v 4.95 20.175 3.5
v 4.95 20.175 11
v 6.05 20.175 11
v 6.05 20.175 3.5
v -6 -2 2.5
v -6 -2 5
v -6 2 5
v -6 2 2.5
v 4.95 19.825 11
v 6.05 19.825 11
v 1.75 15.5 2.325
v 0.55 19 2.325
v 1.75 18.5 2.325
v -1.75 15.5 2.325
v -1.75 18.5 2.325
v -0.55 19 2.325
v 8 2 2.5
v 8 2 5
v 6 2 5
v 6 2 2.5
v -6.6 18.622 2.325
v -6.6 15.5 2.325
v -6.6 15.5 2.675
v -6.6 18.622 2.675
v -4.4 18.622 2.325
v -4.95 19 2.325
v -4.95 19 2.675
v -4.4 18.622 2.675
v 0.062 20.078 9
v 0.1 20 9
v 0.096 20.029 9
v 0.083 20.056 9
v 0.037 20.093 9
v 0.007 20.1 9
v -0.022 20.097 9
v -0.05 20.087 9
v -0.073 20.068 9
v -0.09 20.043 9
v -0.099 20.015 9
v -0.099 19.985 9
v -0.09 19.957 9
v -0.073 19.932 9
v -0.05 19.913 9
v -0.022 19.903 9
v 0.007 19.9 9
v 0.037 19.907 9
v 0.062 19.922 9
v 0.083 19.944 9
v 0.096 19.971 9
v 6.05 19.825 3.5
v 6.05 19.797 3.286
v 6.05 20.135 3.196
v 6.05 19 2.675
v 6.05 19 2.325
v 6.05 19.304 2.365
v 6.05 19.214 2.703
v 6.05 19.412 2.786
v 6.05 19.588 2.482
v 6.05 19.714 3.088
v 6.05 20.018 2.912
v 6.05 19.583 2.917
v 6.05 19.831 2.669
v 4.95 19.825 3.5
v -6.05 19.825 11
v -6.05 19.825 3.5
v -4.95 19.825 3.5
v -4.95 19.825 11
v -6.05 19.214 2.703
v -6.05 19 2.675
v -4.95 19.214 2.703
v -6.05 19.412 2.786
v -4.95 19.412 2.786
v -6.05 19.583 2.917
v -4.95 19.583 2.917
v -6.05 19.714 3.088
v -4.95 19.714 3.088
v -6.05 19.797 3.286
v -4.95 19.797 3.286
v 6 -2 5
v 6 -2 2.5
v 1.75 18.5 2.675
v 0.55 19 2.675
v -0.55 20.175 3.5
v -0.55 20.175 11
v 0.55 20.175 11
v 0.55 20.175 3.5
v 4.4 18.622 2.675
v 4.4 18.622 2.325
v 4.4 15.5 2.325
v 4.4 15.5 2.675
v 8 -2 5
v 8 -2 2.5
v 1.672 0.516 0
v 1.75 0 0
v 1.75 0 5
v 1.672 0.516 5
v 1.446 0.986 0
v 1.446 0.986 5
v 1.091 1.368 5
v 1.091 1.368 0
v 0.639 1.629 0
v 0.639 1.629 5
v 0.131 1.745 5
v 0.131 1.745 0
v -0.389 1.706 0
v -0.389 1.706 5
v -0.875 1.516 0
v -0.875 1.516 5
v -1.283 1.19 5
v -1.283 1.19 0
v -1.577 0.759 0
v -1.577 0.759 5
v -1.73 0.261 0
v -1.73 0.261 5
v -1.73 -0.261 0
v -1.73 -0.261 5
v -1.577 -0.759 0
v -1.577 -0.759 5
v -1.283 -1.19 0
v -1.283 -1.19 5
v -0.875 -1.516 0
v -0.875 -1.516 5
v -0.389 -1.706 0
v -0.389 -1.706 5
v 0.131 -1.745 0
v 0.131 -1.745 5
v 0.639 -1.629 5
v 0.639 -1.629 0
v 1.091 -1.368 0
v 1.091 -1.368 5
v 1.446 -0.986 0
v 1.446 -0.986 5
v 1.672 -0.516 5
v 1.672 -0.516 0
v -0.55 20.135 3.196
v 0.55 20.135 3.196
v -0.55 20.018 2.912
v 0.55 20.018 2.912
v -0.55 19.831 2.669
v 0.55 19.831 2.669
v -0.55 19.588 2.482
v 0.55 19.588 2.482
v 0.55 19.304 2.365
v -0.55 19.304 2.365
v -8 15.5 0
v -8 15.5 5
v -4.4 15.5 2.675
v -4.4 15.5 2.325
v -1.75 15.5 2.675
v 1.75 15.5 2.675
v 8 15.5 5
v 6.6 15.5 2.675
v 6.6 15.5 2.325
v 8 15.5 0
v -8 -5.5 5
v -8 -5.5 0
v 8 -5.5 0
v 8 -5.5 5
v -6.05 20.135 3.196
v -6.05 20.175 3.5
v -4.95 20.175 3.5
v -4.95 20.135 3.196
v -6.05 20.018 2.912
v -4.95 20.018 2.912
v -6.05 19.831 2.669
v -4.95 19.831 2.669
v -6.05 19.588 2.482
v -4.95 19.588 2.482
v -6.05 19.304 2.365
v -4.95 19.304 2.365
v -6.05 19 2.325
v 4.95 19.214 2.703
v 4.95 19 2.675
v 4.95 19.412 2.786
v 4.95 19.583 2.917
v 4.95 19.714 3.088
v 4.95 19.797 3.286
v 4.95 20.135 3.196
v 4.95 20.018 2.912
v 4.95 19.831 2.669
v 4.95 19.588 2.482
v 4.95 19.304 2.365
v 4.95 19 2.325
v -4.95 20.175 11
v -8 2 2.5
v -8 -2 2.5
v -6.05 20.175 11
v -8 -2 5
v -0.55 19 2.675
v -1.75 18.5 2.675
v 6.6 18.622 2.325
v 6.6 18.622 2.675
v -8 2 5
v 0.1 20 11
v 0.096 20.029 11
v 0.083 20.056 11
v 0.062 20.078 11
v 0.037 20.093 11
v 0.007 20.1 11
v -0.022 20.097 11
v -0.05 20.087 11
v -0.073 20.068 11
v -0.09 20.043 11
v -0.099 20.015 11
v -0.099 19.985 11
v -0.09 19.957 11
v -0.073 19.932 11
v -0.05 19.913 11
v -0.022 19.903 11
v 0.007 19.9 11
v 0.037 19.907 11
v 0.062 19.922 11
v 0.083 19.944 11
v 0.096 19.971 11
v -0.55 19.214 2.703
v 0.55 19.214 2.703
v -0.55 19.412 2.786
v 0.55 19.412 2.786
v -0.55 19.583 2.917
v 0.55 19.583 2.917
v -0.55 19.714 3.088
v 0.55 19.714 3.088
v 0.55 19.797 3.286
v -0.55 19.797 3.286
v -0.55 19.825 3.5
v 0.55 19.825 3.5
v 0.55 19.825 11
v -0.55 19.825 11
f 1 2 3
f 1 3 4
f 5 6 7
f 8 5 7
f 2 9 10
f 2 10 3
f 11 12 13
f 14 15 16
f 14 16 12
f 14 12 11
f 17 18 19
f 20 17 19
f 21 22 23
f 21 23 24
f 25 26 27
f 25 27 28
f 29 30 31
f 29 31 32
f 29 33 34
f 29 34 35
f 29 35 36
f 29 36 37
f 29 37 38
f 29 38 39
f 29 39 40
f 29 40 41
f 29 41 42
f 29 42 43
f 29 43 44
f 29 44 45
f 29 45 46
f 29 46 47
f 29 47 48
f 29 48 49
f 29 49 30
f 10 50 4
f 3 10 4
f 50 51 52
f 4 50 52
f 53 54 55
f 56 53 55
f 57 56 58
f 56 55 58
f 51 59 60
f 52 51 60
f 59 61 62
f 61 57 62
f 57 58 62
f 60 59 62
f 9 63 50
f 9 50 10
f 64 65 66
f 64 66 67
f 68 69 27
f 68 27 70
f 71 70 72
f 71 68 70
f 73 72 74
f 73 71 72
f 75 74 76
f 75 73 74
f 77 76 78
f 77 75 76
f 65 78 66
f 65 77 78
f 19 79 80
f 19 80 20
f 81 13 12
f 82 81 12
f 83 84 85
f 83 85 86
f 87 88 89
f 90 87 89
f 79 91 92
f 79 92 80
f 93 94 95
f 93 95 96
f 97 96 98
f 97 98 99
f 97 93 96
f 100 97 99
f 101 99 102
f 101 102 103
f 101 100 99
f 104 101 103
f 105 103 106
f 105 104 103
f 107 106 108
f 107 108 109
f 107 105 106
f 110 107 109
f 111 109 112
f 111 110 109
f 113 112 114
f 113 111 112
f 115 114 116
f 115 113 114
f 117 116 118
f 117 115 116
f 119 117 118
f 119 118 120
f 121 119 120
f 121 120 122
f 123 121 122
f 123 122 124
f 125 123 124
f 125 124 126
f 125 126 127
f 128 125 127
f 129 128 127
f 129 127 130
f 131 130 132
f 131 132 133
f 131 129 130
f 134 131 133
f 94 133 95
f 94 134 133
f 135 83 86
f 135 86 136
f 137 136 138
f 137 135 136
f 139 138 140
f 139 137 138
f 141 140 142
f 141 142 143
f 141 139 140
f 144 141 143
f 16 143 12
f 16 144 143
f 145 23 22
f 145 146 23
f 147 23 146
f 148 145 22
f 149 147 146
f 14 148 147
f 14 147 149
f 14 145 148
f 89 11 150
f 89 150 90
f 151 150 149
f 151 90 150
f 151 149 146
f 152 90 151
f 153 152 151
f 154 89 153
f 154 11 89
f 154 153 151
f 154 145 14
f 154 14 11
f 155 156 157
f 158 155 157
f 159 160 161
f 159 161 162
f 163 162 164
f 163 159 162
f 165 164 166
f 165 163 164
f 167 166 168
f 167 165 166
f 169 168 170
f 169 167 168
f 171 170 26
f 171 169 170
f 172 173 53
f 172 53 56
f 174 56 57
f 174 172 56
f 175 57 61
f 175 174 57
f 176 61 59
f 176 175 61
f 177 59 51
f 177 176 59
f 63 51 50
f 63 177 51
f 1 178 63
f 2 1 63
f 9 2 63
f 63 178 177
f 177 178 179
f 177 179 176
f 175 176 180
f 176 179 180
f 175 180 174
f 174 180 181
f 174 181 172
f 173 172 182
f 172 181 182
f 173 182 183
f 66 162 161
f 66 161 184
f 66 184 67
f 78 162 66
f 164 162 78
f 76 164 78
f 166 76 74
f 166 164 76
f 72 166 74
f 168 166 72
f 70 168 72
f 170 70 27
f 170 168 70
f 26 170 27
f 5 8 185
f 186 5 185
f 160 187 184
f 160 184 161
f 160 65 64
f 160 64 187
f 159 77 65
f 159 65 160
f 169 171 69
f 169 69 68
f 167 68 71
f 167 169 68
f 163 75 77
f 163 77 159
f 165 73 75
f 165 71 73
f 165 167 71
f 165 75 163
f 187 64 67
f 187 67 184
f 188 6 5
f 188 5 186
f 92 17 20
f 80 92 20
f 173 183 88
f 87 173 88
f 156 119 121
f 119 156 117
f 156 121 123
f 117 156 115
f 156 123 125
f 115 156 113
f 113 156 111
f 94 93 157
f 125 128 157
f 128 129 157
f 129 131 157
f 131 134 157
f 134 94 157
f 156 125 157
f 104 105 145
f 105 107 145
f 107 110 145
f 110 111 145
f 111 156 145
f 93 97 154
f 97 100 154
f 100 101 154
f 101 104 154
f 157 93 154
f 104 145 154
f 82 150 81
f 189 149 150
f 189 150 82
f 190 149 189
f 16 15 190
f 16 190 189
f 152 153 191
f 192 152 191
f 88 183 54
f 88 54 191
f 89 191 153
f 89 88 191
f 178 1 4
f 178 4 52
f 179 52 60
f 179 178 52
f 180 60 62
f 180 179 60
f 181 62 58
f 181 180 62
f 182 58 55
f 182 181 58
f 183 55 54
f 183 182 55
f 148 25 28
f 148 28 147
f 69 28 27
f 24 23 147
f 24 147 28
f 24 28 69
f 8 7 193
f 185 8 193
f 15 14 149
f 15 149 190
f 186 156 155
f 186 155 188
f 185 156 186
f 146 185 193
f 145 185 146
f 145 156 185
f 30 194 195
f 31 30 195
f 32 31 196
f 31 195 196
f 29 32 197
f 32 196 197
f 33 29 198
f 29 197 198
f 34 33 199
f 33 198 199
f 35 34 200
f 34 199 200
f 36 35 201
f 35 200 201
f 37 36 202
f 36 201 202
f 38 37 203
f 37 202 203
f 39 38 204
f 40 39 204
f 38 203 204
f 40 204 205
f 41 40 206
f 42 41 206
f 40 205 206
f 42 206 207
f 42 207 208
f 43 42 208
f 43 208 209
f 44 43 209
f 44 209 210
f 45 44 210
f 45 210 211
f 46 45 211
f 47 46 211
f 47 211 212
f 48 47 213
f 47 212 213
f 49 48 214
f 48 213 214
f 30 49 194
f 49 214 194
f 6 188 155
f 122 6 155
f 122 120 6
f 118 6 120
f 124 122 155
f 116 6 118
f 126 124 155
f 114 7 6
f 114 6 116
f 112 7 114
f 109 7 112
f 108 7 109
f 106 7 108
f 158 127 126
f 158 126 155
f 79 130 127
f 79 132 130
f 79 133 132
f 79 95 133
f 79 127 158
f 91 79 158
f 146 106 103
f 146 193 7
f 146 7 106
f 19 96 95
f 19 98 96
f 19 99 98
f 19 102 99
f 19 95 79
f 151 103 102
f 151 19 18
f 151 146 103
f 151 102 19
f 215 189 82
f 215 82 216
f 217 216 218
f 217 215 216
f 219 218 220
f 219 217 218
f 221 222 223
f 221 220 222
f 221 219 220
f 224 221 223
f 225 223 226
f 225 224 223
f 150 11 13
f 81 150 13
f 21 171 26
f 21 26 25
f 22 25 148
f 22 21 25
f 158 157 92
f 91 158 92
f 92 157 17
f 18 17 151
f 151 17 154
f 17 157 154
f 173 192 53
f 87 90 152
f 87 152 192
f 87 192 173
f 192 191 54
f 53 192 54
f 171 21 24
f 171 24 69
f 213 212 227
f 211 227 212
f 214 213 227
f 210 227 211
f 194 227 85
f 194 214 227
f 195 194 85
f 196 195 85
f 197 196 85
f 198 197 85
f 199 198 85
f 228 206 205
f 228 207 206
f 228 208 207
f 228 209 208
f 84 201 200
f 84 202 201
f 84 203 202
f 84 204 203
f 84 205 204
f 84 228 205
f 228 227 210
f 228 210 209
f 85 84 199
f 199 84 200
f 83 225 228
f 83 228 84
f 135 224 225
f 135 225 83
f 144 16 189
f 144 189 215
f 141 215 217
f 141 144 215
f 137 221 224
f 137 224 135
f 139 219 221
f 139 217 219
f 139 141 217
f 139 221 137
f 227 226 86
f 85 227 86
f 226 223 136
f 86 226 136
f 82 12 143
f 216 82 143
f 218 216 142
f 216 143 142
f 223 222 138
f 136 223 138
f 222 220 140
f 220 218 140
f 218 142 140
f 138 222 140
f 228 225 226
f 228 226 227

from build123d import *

# Parameters (mm, degrees)
SKETCH_1_W          = 16
SKETCH_1_H          = 21
SKETCH_1_R          = 1.75
EXTRUDE_1_DEPTH     = 5
EXTRUDE_1_2_DEPTH   = 16
CUT_EXTRUDE_1_DEPTH = 16
SKETCH_4_W          = 3.81913455
SKETCH_4_H          = 4
CUT_EXTRUDE_2_DEPTH = 2.5
SKETCH_5_R          = 0.1
CUT_EXTRUDE_3_DEPTH = 2


with BuildPart() as part:
    # Эскиз1 → Extrude 1 (new body)
    with BuildSketch(Plane.XY):
        with Locations((0, 5)):
            Rectangle(SKETCH_1_W, SKETCH_1_H)
        Circle(SKETCH_1_R, mode=Mode.SUBTRACT)
    extrude(amount=EXTRUDE_1_DEPTH)

    # Эскиз2 → Extrude 1 2 (add)
    with BuildSketch(Plane.ZY.offset(8)):
        with BuildLine():
            Line((2.675, 15.5), (2.675, 19))
            ThreePointArc((2.675, 19), (2.916636906, 19.583363094), (3.5, 19.825))
            Line((3.5, 19.825), (11, 19.825))
            Line((11, 19.825), (11, 20.175))
            Line((11, 20.175), (3.5, 20.175))
            ThreePointArc((3.5, 20.175), (2.669149532, 19.830850468), (2.325, 19))
            Line((2.325, 19), (2.325, 15.5))
            Line((2.325, 15.5), (2.675, 15.5))
        make_face()
    extrude(amount=-EXTRUDE_1_2_DEPTH)

    # Эскиз3 → Вырез-Вытянуть1 (cut)
    with BuildSketch(Plane(origin=(0, 0, 2.325), x_dir=(-1, 0, 0), z_dir=(0, 0, -1))):
        Polygon((-1.75, 15.5), (-1.75, 18.5), (-0.55, 19), (-0.55, 20.937907948), (-4.95, 20.937907948), (-4.95, 19), (-4.4, 18.622085888), (-4.4, 15.5), align=None)
        Polygon((0.55, 19), (0.55, 20.937907948), (4.95, 20.937907948), (4.95, 19), (4.4, 18.622085888), (4.4, 15.5), (1.75, 15.5), (1.75, 18.5), align=None)
        Polygon((-6.05, 19), (-6.05, 20.937907948), (-9.320905805, 20.937907948), (-9.320905805, 15.5), (-6.6, 15.5), (-6.6, 18.622085888), align=None)
        Polygon((6.05, 19), (6.05, 20.937907948), (9.499807758, 20.937907948), (9.499807758, 15.5), (6.6, 15.5), (6.6, 18.622085888), align=None)
    extrude(amount=-CUT_EXTRUDE_1_DEPTH, mode=Mode.SUBTRACT)

    # Эскиз4 → Вырез-Вытянуть2 (cut)
    with BuildSketch(Plane(origin=(0, 0, 5), x_dir=(-1, 0, 0), z_dir=(0, 0, -1))):
        with Locations((7.909567275, 0)):
            Rectangle(SKETCH_4_W, SKETCH_4_H)
        with Locations((-7.909567275, 0)):
            Rectangle(SKETCH_4_W, SKETCH_4_H)
    extrude(amount=CUT_EXTRUDE_2_DEPTH, mode=Mode.SUBTRACT)

    # Эскиз5 → Вырез-Вытянуть3 (cut)
    with BuildSketch(Plane.XY.offset(11)):
        with Locations((0, 20)):
            Circle(SKETCH_5_R)
    extrude(amount=-CUT_EXTRUDE_3_DEPTH, mode=Mode.SUBTRACT)


solid = part.part
